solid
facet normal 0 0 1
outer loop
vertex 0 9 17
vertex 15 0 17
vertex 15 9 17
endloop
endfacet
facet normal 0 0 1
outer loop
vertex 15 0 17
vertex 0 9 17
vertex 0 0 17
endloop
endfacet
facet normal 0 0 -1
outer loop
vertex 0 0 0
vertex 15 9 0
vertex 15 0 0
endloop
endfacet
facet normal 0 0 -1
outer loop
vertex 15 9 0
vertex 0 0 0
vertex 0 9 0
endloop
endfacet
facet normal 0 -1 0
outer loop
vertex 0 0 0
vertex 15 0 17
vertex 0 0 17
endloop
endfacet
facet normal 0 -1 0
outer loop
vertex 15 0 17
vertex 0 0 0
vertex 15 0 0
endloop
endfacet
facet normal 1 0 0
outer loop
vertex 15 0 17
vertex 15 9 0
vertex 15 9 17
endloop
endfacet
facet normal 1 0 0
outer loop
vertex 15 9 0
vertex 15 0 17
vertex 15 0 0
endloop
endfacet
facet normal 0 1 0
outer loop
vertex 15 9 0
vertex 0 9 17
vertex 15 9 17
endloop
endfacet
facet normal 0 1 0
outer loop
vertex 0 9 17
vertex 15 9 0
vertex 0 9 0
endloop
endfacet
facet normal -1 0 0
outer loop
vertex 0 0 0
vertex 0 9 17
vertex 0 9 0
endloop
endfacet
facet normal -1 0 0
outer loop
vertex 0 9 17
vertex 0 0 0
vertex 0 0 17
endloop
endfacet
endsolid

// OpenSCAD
// Generated by SolidPython 1.0.1 on 2020-07-29 00:46:55


cube(size = [15, 9, 17]);
/***********************************************
*********      SolidPython code:      **********
************************************************
 
# import packages: SolidPython
from solid import *
from solid.utils import *
from itertools import chain, combinations, permutations


class Resize:

    def __init__(self, scad_file):
        self.scad_file = scad_file
        #self.scad_file = import_scad(scad_file)
        # cone/cylinder param:
        self.r1 = 0
        self.r2 = 0
        self.h = 0
        # rectangular prism param:
        self.w = 0
        self.l = 0
        # ellipse param:
        self.r = 0

    # import OpenScad code (file name corresponds to shape)


    # classify shape + parameters
    def assign(self, param1, param2, param3):
        if self.scad_file == 'cone.scad':
            self.r1 = param1
            self.r2 = param2
            self.h = param3
        elif self.scad_file == 'cylinder.scad':
            self.r1 = param1
            self.r2 = param2
            self.h = param3
        elif self.scad_file == 'rectangularPrism.scad':
            self.h = param1
            self.l = param2
            self.w = param3
        else:
            self.r = param1
            self.h = param2

    # resize parameters
    def iterate(self):
        x = range(3, 20, 2)
        i = 1
        if self.scad_file == 'cone.scad':
            tempList = list(permutations(x, 2))
            for temp in tempList:
                param1 = temp[0]
                param2 = temp[1]
                filepath = 'produced_scad_files/' + 'cone' + str(param1) + '_' + str(param2) + '_' + '.scad'
                scad_render_to_file(cylinder(h=param1, r1=param2, r2=0), filepath)

        elif self.scad_file == 'cylinder.scad':
            tempList = list(permutations(x, 3))
            for temp in tempList:
                param1 = temp[0]
                param2 = temp[1]
                filepath = 'produced_scad_files/' + 'cylinder' + str(param1) + '_' + str(param2) + '_' + '.scad'
                scad_render_to_file(cylinder(h=param1, r1=param2, r2=param2), filepath)

        elif self.scad_file == 'rectangularPrism.scad':
            tempList = list(permutations(x, 3))
            for temp in tempList:
                param1 = temp[0]
                param2 = temp[1]
                param3 = temp[2]
                filepath = 'produced_scad_files/' + 'rectangularPrism' + str(param1) + '_' + str(param2) + '_' + str(
                    param3) + '.scad'
                scad_render_to_file(cube(size=(param1, param2, param3)), filepath)

        elif self.scad_file == 'ellipse.scad':
            tempList = list(permutations(x, 4))
            for temp in tempList:
                param1 = temp[0]
                param2 = temp[1]
                param3 = temp[2]
                param4 = temp[3]
                filepath = 'produced_scad_files/' + 'ellipse' + str(param1) + '_' + str(param2) + '_' + str(param3) + '_' + str(param4) + '.scad'
                scad_render_to_file(scale([param1, param2, param3])(sphere(r=param4)), filepath)

    def render_to_scadfile(self):
        scad_render_to_file(scad, 'example.scad') 
 
************************************************/
